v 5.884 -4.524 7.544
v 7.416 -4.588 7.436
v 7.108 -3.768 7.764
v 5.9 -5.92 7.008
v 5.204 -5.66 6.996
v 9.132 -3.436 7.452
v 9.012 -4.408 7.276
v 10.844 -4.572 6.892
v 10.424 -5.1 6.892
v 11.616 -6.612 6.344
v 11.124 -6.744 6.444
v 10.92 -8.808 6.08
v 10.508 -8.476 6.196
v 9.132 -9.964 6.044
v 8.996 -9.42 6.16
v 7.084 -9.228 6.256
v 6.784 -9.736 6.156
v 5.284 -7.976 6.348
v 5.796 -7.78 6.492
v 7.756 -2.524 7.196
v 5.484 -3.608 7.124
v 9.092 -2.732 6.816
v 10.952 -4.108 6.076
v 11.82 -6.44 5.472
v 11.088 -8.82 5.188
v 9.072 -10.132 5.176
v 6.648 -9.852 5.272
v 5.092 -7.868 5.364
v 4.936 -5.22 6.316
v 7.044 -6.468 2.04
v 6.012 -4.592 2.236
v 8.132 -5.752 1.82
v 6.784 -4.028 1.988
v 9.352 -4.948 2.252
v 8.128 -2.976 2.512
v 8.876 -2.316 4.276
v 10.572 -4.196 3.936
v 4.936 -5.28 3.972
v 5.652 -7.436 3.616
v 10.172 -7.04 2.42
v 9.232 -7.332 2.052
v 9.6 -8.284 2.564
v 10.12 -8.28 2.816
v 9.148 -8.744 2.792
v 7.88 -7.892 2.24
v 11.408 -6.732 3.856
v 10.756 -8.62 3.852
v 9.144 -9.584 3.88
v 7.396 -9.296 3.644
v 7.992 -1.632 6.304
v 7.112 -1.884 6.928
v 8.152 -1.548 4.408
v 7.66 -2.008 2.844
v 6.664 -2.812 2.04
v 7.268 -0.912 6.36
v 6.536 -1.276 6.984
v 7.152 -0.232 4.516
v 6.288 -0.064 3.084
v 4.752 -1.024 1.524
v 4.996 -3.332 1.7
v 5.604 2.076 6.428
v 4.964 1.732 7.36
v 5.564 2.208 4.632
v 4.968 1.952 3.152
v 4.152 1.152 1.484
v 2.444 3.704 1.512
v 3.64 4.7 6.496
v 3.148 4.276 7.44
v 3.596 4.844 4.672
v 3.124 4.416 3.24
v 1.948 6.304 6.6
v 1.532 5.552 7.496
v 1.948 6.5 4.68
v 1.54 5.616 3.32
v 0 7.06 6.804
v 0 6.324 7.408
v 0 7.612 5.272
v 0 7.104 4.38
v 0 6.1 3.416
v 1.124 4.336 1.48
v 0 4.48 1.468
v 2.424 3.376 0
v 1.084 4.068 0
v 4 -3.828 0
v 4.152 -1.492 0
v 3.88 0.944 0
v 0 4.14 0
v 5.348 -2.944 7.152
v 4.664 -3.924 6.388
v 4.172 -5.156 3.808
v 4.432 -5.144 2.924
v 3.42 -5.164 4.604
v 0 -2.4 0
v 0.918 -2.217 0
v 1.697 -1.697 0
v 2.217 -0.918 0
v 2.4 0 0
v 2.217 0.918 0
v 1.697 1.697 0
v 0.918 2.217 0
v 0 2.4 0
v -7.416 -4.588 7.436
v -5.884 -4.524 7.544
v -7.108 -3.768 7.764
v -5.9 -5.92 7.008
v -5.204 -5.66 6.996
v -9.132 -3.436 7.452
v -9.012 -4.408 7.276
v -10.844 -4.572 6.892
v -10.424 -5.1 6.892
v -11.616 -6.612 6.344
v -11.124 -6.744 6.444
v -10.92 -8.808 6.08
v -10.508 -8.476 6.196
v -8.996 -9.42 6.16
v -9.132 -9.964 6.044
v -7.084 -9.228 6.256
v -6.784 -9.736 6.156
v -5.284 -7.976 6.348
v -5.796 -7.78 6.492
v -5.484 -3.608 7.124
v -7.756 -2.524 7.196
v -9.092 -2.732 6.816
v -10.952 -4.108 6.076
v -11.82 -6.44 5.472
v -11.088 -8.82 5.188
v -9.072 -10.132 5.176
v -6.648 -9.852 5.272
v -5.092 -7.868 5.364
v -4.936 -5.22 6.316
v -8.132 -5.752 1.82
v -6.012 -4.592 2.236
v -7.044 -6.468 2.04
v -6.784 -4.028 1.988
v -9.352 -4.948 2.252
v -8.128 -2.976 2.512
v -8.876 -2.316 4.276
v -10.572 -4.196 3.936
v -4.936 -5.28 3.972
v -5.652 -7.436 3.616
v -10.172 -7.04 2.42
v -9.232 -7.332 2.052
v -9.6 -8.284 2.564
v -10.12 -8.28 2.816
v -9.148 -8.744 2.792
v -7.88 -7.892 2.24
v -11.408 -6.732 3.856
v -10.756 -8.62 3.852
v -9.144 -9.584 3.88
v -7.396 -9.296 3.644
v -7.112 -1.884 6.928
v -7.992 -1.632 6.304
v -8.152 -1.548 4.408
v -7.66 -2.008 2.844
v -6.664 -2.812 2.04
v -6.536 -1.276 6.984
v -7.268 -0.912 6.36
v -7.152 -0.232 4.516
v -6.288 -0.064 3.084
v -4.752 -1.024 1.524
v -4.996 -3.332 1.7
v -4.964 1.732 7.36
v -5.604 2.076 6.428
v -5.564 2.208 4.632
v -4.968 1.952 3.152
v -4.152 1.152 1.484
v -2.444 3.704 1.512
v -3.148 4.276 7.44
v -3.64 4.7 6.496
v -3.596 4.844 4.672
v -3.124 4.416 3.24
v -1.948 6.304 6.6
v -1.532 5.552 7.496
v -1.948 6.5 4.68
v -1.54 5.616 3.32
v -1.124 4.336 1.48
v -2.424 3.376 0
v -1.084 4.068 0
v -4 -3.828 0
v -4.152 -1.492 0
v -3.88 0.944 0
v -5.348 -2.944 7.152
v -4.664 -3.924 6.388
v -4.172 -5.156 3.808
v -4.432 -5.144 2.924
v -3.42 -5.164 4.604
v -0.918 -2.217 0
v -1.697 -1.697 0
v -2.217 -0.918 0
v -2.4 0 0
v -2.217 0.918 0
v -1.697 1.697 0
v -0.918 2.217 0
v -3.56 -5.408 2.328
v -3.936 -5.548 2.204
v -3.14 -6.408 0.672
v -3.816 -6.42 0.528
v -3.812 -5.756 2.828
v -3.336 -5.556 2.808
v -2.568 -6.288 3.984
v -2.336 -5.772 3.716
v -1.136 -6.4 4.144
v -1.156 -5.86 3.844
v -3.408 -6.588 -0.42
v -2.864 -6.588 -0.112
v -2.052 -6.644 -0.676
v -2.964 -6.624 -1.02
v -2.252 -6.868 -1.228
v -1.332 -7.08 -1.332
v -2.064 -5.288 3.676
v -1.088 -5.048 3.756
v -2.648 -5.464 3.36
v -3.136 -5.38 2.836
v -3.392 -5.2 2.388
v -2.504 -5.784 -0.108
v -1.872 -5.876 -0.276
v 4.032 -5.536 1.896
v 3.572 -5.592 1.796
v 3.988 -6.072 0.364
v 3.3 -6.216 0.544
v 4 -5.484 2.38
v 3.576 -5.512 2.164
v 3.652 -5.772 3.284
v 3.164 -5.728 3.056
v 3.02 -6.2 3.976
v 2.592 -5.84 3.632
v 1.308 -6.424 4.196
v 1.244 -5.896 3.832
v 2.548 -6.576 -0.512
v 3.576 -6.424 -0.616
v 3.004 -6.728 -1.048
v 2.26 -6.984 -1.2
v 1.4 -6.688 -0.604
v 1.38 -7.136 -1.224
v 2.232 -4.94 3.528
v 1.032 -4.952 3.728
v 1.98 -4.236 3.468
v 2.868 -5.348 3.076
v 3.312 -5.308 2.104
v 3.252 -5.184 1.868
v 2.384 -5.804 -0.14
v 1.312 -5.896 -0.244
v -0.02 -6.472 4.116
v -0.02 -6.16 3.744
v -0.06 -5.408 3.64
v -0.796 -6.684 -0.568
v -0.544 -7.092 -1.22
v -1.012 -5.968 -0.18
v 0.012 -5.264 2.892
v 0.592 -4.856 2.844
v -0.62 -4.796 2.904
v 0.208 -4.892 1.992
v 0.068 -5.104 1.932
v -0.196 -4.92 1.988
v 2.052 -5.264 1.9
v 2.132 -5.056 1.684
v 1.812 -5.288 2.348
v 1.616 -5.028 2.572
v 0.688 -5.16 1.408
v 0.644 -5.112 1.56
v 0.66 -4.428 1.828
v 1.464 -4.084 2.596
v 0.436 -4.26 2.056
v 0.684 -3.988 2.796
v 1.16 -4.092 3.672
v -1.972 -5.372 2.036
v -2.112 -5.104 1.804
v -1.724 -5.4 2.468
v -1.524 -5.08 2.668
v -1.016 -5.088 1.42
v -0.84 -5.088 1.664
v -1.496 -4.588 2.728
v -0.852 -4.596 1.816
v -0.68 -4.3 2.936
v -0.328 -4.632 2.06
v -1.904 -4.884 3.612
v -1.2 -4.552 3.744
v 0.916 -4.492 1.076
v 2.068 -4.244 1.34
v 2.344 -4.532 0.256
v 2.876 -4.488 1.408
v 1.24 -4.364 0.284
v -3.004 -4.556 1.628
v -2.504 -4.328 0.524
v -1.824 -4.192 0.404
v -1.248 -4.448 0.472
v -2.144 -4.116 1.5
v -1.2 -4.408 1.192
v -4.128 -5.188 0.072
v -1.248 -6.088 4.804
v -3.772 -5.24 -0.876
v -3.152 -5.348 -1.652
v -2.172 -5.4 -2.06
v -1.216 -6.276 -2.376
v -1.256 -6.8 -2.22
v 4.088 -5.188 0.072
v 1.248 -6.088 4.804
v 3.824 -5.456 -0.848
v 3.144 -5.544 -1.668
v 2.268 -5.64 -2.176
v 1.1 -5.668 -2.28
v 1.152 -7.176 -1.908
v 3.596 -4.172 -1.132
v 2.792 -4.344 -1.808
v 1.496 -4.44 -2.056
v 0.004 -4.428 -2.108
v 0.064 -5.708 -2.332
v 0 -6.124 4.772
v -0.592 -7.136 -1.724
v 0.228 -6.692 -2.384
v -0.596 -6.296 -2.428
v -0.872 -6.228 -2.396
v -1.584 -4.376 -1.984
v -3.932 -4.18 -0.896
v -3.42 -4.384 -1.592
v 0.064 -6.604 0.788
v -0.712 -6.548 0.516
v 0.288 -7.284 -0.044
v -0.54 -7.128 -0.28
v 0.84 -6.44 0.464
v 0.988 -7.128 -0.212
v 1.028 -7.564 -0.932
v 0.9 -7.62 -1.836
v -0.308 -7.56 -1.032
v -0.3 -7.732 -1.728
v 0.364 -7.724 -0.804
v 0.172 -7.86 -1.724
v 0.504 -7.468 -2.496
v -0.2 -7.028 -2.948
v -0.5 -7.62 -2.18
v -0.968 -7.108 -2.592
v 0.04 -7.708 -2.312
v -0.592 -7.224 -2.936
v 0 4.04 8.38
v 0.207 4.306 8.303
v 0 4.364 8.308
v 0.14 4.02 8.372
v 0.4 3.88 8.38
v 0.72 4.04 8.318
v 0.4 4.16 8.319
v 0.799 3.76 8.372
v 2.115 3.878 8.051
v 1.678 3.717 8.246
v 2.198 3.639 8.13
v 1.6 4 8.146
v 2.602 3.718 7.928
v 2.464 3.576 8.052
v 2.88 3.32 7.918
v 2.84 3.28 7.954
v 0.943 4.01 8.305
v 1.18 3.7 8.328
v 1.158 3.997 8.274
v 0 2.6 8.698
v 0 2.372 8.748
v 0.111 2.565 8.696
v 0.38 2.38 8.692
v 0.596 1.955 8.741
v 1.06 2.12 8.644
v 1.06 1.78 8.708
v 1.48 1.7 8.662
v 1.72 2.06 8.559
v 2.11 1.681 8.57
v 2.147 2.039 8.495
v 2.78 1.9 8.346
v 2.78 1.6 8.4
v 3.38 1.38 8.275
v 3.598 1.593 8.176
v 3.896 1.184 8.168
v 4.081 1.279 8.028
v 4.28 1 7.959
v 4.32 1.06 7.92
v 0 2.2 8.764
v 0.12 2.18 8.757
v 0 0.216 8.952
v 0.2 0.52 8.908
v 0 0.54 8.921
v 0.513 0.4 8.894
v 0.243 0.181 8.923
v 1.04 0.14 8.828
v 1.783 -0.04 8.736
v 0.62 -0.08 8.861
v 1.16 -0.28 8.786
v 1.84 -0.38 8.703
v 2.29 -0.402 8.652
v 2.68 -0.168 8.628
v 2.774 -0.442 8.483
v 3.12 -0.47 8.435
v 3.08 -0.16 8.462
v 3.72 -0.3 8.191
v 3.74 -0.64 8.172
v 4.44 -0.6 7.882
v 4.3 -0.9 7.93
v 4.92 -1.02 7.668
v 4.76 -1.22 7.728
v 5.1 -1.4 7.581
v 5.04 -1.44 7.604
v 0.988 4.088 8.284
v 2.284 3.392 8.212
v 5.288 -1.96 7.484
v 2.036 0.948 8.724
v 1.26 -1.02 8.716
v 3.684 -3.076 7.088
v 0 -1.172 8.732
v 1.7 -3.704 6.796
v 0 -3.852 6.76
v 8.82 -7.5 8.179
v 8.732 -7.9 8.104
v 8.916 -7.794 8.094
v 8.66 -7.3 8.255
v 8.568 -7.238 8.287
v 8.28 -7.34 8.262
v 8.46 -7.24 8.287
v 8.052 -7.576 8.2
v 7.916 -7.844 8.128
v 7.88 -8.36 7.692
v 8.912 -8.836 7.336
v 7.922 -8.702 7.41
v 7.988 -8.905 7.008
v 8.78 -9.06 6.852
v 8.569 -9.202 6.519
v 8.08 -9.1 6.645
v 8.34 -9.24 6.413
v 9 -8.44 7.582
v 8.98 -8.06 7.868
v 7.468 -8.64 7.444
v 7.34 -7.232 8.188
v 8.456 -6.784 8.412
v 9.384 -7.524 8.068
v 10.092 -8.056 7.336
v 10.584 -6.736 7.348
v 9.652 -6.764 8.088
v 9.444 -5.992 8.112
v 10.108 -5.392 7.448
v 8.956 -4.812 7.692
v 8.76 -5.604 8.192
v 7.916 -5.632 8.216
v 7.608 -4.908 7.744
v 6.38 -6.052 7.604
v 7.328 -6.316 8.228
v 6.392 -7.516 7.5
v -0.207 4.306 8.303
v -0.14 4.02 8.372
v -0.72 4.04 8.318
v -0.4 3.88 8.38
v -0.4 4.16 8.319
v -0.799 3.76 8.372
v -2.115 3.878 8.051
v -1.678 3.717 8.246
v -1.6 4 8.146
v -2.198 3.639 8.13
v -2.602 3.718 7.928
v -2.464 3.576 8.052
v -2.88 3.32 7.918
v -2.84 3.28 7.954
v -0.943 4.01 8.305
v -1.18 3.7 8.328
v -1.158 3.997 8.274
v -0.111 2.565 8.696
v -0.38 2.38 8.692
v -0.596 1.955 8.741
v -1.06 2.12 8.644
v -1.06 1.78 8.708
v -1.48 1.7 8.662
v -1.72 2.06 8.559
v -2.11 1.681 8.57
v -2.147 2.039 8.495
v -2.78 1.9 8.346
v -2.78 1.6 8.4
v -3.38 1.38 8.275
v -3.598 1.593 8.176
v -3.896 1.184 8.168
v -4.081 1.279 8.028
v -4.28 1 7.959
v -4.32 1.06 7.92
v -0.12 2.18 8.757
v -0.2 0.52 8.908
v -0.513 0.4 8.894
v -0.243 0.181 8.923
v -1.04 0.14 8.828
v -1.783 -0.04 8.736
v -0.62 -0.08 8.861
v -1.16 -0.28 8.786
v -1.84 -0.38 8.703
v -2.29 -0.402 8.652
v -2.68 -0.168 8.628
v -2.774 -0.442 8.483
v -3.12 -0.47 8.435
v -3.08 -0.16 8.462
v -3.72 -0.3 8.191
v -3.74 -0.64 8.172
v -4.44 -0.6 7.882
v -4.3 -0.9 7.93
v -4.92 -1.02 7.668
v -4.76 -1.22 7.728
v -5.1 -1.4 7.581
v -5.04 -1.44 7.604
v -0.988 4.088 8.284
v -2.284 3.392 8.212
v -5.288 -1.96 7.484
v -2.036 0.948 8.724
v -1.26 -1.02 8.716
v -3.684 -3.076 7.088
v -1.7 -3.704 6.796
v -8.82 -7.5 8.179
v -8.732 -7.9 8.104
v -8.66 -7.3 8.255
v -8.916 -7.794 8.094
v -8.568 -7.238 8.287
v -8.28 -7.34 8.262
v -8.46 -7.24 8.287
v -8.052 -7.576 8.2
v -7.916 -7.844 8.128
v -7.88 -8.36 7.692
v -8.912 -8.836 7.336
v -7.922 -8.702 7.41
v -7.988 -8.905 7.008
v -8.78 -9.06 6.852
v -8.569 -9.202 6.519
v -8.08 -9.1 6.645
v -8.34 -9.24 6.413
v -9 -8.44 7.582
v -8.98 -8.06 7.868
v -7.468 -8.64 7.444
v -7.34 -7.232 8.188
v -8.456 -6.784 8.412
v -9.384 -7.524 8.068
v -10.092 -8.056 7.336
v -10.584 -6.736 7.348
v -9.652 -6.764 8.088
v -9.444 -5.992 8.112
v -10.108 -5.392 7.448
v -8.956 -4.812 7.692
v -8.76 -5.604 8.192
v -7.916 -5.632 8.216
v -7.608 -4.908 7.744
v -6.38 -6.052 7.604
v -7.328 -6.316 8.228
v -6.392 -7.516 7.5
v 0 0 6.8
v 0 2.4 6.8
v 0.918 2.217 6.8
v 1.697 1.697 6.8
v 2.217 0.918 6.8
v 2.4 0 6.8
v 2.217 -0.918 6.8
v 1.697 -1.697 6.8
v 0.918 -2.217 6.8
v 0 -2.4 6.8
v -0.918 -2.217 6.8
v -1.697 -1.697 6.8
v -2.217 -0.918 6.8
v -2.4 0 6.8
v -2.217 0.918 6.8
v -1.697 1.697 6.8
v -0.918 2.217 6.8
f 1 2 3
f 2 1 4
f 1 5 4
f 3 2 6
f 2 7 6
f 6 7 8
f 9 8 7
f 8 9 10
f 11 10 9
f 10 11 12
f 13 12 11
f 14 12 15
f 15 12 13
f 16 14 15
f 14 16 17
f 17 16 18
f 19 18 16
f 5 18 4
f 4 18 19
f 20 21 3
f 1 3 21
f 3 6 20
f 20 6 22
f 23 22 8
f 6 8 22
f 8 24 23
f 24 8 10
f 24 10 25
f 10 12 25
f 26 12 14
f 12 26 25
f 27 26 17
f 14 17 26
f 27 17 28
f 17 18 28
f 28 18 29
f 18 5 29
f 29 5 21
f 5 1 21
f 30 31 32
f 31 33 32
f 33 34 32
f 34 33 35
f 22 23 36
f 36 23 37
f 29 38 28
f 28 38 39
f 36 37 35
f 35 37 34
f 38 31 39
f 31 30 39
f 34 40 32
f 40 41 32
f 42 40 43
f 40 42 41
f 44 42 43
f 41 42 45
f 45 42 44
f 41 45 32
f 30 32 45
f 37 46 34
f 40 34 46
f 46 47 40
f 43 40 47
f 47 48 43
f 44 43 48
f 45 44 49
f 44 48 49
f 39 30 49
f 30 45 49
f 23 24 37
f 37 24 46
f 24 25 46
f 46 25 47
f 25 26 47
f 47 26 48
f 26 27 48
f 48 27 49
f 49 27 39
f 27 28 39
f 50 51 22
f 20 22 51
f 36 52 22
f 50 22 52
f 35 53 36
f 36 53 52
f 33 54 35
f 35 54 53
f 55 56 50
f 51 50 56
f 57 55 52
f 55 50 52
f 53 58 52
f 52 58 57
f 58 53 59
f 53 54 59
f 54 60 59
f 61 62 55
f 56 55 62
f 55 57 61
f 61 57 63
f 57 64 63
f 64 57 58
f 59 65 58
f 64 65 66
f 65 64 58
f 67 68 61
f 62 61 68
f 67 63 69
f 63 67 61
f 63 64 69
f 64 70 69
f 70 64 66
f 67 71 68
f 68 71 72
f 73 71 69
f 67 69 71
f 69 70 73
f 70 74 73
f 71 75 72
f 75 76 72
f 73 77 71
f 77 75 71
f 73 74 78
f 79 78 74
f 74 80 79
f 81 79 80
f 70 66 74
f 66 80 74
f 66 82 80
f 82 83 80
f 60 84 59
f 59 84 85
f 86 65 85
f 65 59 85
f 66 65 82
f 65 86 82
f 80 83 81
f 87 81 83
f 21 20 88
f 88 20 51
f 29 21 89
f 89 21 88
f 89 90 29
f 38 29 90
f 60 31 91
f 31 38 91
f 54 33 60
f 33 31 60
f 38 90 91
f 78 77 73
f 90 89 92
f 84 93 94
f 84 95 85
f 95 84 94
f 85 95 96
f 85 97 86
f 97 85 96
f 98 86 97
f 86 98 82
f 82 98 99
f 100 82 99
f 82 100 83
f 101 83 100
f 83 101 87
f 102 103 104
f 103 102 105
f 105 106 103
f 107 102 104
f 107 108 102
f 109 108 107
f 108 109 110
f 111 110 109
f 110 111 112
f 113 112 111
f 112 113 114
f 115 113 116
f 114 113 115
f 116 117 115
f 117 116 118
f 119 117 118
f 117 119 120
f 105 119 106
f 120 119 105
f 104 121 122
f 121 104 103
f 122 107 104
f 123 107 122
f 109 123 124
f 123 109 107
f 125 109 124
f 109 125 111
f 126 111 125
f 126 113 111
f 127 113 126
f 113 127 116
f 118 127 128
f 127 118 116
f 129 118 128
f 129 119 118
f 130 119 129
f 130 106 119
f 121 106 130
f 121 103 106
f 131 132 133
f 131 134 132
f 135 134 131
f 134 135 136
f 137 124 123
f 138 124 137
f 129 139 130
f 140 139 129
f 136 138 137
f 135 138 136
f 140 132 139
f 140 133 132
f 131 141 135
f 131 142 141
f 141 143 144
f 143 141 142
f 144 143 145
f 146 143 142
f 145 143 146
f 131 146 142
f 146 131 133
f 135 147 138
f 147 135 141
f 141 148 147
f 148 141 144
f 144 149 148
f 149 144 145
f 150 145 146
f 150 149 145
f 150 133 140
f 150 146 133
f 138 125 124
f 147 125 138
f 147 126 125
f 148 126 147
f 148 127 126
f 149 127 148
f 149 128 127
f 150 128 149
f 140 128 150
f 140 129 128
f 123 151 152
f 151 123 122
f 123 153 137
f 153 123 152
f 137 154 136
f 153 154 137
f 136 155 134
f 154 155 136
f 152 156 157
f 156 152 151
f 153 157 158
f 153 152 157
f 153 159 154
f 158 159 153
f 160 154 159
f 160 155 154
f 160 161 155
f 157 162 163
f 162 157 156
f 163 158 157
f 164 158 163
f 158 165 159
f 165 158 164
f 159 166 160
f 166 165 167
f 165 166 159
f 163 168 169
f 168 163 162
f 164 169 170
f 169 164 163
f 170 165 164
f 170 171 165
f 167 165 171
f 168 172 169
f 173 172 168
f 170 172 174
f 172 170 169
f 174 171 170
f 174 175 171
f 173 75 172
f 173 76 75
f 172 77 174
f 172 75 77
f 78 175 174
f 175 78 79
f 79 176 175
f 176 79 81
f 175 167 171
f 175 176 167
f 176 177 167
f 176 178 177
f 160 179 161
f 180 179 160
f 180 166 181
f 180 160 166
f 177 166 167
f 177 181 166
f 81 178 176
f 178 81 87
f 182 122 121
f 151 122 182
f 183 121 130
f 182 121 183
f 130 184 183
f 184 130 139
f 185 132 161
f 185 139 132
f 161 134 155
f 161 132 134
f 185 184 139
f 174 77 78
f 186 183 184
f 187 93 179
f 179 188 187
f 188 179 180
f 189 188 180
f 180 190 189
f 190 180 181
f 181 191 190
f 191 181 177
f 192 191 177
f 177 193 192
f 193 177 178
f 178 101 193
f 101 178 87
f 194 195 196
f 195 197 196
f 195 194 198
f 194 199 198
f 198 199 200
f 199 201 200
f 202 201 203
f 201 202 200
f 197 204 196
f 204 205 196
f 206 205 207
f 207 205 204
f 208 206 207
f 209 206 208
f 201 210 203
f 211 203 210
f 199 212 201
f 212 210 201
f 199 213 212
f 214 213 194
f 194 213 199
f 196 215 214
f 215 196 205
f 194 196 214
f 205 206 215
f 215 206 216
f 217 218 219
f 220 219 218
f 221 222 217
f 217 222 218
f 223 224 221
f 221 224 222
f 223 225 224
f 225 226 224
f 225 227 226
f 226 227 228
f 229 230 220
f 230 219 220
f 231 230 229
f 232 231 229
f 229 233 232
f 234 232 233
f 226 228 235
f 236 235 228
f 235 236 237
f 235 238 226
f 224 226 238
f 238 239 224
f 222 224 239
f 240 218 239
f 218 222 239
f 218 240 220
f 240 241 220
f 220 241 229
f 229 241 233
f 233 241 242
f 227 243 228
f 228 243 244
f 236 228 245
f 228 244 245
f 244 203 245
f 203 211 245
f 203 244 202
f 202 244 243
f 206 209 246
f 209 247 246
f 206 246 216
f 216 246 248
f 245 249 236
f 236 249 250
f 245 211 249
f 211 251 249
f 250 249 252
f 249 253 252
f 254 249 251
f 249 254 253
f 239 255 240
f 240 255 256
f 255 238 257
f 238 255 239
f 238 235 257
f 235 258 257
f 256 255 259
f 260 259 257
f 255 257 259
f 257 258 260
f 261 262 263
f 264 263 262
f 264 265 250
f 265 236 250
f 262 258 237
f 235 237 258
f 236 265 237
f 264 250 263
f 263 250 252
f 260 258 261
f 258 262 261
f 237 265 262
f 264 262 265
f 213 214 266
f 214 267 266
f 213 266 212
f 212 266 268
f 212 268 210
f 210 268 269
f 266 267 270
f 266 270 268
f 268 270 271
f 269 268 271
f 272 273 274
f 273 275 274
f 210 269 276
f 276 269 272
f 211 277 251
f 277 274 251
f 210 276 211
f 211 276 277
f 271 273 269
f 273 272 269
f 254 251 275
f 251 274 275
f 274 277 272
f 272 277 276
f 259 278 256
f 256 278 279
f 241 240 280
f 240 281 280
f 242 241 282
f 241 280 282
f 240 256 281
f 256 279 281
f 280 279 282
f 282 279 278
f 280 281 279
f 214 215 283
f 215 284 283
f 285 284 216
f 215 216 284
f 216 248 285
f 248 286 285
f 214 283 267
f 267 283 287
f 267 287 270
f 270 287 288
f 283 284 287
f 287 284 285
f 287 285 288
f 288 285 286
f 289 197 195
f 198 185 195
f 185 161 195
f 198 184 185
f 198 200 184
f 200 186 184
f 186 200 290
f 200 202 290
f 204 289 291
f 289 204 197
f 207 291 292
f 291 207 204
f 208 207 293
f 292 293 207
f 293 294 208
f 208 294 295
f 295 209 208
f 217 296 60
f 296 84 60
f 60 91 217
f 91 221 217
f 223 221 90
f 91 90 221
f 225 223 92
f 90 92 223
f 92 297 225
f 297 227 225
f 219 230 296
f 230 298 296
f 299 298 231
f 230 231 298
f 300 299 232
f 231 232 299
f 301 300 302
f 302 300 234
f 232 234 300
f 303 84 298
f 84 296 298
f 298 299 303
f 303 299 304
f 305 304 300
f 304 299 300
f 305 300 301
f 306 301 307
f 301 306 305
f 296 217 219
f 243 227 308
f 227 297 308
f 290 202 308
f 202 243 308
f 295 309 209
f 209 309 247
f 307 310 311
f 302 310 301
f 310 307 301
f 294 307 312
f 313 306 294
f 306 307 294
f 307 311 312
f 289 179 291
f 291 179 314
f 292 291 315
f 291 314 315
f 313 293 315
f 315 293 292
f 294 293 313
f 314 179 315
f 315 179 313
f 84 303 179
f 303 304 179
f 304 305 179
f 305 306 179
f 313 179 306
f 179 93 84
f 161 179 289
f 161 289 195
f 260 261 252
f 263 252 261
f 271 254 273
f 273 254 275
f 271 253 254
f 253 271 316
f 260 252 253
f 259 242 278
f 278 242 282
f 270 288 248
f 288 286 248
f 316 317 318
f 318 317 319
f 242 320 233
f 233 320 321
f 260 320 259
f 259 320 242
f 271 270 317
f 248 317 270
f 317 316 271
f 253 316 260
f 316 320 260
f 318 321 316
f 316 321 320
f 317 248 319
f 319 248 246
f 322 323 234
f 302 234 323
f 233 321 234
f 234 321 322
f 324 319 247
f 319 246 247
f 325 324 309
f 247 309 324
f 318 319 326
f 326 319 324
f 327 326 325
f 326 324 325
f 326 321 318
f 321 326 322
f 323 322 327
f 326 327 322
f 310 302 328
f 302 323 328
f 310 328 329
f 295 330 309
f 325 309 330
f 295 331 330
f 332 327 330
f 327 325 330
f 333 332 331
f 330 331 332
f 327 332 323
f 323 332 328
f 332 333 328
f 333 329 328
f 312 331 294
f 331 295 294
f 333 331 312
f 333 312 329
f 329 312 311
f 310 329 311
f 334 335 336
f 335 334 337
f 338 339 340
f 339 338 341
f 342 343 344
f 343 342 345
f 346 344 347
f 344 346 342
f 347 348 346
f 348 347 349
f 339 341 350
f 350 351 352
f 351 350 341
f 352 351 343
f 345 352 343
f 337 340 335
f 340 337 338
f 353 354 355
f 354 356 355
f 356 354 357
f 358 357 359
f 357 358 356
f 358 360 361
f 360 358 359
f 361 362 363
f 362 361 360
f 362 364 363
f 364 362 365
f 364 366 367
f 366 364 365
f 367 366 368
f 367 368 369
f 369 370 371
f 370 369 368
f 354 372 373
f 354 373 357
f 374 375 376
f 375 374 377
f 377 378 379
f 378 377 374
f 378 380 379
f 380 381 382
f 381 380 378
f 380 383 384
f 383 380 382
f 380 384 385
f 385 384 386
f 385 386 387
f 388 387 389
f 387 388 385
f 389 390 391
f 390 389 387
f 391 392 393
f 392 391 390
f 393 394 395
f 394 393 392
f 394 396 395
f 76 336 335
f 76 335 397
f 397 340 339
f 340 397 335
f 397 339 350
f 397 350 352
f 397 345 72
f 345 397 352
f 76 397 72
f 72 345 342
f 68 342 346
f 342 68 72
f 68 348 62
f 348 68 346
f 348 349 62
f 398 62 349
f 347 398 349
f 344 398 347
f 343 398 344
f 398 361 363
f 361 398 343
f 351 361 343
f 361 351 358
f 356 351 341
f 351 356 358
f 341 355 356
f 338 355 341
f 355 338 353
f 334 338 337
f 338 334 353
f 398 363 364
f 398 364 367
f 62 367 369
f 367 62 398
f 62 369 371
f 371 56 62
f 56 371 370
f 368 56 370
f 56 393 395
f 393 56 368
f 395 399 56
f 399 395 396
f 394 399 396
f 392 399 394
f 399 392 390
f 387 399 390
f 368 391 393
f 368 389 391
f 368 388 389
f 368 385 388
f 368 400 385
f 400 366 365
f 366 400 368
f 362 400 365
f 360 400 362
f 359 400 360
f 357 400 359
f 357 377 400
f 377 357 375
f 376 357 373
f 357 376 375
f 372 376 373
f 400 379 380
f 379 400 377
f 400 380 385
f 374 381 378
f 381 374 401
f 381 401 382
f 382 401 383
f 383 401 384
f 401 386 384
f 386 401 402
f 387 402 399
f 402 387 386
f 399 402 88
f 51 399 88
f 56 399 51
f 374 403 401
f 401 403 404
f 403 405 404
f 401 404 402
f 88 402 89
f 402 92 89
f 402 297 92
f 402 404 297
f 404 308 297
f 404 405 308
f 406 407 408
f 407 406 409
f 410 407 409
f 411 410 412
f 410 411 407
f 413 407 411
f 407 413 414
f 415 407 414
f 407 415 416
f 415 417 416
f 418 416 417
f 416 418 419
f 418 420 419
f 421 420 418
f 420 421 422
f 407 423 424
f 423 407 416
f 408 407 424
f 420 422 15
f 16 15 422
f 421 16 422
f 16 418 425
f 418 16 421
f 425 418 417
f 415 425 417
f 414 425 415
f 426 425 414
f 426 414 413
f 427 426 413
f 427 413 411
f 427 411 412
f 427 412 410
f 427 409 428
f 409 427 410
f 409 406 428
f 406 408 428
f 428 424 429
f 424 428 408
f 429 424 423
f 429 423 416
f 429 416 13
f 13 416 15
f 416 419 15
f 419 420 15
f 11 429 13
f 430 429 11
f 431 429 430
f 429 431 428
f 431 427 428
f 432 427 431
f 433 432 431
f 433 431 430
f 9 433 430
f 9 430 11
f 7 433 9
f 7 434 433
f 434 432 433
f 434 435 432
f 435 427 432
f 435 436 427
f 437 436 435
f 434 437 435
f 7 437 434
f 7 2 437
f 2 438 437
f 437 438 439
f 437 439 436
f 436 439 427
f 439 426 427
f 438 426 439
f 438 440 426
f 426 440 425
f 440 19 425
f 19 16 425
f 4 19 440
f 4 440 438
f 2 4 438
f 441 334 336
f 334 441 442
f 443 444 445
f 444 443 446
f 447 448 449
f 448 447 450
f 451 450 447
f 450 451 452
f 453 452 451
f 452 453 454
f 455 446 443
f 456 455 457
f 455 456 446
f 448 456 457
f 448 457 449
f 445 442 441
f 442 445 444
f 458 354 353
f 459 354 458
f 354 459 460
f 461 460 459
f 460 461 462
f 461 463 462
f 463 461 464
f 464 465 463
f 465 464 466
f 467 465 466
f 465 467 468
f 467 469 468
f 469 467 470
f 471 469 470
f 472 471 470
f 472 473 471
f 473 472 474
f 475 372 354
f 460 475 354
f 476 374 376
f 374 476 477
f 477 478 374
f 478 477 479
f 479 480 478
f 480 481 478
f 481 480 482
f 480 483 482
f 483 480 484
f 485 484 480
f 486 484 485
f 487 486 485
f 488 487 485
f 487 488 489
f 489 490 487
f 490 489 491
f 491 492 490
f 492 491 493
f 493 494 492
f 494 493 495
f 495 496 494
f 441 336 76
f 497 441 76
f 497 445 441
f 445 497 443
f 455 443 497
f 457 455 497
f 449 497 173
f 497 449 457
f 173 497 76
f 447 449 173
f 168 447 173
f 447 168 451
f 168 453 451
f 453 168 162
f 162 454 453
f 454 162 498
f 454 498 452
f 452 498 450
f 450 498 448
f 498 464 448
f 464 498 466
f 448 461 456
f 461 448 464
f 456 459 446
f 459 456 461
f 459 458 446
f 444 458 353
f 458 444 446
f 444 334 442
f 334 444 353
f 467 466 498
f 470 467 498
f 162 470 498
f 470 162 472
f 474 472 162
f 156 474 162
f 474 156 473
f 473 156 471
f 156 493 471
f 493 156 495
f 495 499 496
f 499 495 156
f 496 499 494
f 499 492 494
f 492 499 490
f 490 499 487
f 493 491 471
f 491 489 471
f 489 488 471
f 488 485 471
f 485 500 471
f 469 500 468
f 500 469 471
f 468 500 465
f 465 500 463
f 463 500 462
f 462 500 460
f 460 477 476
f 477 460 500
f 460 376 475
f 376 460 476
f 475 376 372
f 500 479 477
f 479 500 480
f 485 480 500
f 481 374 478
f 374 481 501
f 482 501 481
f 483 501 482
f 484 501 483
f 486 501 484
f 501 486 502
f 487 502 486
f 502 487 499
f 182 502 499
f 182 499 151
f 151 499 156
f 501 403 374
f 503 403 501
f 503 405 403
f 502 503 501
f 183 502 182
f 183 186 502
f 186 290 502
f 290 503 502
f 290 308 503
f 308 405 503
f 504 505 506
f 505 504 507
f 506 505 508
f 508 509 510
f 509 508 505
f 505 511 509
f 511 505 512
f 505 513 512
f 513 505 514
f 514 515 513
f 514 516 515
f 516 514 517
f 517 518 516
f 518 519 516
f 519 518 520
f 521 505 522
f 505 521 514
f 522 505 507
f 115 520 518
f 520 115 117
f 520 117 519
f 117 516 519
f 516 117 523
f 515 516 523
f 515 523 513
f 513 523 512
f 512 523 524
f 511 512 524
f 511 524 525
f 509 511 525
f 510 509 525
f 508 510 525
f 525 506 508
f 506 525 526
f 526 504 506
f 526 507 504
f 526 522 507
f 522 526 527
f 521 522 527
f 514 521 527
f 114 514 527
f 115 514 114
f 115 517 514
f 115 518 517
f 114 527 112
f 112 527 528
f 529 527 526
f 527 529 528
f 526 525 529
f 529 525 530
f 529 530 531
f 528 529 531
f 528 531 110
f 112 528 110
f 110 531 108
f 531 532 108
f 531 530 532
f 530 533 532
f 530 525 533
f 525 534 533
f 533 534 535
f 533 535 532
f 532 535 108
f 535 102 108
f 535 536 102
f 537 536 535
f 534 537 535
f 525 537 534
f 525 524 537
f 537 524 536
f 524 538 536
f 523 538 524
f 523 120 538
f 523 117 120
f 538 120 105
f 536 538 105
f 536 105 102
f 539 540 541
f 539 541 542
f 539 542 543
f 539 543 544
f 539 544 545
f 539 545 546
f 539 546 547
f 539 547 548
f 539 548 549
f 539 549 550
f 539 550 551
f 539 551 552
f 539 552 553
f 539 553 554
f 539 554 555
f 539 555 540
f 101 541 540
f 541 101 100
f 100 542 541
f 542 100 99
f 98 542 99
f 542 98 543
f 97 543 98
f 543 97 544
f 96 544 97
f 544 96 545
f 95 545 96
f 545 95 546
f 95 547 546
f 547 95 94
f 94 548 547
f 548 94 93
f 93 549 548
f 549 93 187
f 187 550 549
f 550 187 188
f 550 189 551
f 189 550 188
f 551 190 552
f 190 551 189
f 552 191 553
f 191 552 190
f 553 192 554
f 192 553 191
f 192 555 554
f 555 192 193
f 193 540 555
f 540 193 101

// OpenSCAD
use <../lib.scad>
use <../p/4-4cylc.scad>
use <s/85947s01.scad>
use <s/85947s02.scad>
use <s/85947s03.scad>
use <s/85947s04p01.scad>
$fa=1; $fs=0.2;
function ldraw_lib__85947p01(realsolid=false) = [
// 0 Minifig Head Alien Squidman with Black Eyes & Lines Pattern
// 0 Name: 85947p01.dat
// 0 Author: Philippe Hurbain [Philo]
// 0 !LDRAW_ORG Part UPDATE 2013-01
// 0 !LICENSE Licensed under CC BY 2.0 and CC BY 4.0 : see CAreadme.txt
// 
// 0 BFC CERTIFY CCW
  [0,"BFC","CERTIFY"],
  [0,"BFC","CCW"],
// 
// 0 !HISTORY 2013-01-06 {LEGO Digital Designer} Original part shape
// 0 !HISTORY 2013-01-06 [Philo] File preparation for LDraw Parts Tracker
// 0 !HISTORY 2013-07-21 [PTadmin] Official Update 2013-01
// 
// 
// 1 16 0 0 0 1 0 0 0 1 0 0 0 1 s\85947s01.dat
  [1,16,0,0,0,1,0,0,0,1,0,0,0,1, ldraw_lib__s__85947s01(realsolid)],
// 1 16 0 0 0 -1 0 0 0 1 0 0 0 1 s\85947s01.dat
  [1,16,0,0,0,-1,0,0,0,1,0,0,0,1, ldraw_lib__s__85947s01(realsolid)],
// 1 16 0 0 0 1 0 0 0 1 0 0 0 1 s\85947s02.dat
  [1,16,0,0,0,1,0,0,0,1,0,0,0,1, ldraw_lib__s__85947s02(realsolid)],
// 1 4 0 0 0 1 0 0 0 1 0 0 0 1 s\85947s03.dat
  [1,4,0,0,0,1,0,0,0,1,0,0,0,1, ldraw_lib__s__85947s03(realsolid)],
// 1 16 0 0 0 1 0 0 0 1 0 0 0 1 s\85947s04p01.dat
  [1,16,0,0,0,1,0,0,0,1,0,0,0,1, ldraw_lib__s__85947s04p01(realsolid)],
// 1 16 0 0 0 -1 0 0 0 1 0 0 0 1 s\85947s04p01.dat
  [1,16,0,0,0,-1,0,0,0,1,0,0,0,1, ldraw_lib__s__85947s04p01(realsolid)],
// 0 BFC INVERTNEXT
  [0,"BFC","INVERTNEXT"],
// 1 16 0 -17 0 0 0 6 0 17 0 6 0 0 4-4cylc.dat
  [1,16,0,-17,0,0,0,6,0,17,0,6,0,0, ldraw_lib__4_4cylc(realsolid)],
// 5 24 0 -17.01 17.65 0 -18.52 15.81 3.83 -18.74 13.88 -3.83 -18.74 13.88
  [5,24,0,-17.01,17.65,0,-18.52,15.81,3.83,-18.74,13.88,-3.83,-18.74,13.88],
// 5 24 0 -13.18 19.03 0 -17.01 17.65 4.87 -16.5 15.76 -4.87 -16.5 15.76
  [5,24,0,-13.18,19.03,0,-17.01,17.65,4.87,-16.5,15.76,-4.87,-16.5,15.76],
// 5 24 0 -8.54 15.25 0 -10.95 17.76 3.85 -8.3 14.04 -3.85 -8.3 14.04
  [5,24,0,-8.54,15.25,0,-10.95,17.76,3.85,-8.3,14.04,-3.85,-8.3,14.04],
// 5 24 0 -3.67 11.2 0 -8.54 15.25 2.81 -3.7 10.84 -2.81 -3.7 10.84
  [5,24,0,-3.67,11.2,0,-8.54,15.25,2.81,-3.7,10.84,-2.81,-3.7,10.84],
// 5 24 0 0 10.35 0 -3.67 11.2 2.71 0 10.17 -2.71 0 10.17
  [5,24,0,0,10.35,0,-3.67,11.2,2.71,0,10.17,-2.71,0,10.17],
// 5 24 0 -10.95 17.76 0 -13.18 19.03 4.87 -11.7 16.25 -4.87 -11.7 16.25
  [5,24,0,-10.95,17.76,0,-13.18,19.03,4.87,-11.7,16.25,-4.87,-11.7,16.25],
// 5 24 0 -18.52 15.81 0 -20.77 10.91 2.47 -20.71 10.22 -2.47 -20.71 10.22
  [5,24,0,-18.52,15.81,0,-20.77,10.91,2.47,-20.71,10.22,-2.47,-20.71,10.22],
// 5 24 0 -21.87 5.93 0 -22.38 0.54 5.09 -21.81 2.37 -5.09 -21.81 2.37
  [5,24,0,-21.87,5.93,0,-22.38,0.54,5.09,-21.81,2.37,-5.09,-21.81,2.37],
// 5 24 0 -20.77 10.91 0 -21.87 5.93 2.47 -20.71 10.22 -2.47 -20.71 10.22
  [5,24,0,-20.77,10.91,0,-21.87,5.93,2.47,-20.71,10.22,-2.47,-20.71,10.22],
// 5 24 0 -22.38 0.54 0 -21.83 -2.93 3.15 -21.79 -2.55 -3.15 -21.79 -2.55
  [5,24,0,-22.38,0.54,0,-21.83,-2.93,3.15,-21.79,-2.55,-3.15,-21.79,-2.55],
// 5 24 0 -21.83 -2.93 0 -16.9 -9.63 4.25 -16.99 -9.26 -4.25 -16.99 -9.26
  [5,24,0,-21.83,-2.93,0,-16.9,-9.63,4.25,-16.99,-9.26,-4.25,-16.99,-9.26],
// 5 24 0 -16.9 -9.63 0 -11.93 -15.31 4.25 -16.99 -9.26 -4.25 -16.99 -9.26
  [5,24,0,-16.9,-9.63,0,-11.93,-15.31,4.25,-16.99,-9.26,-4.25,-16.99,-9.26],
];
module ldraw_lib__85947p01(step=0, col=false, unit=2/5, alt=false, line=0.2, solid=!$preview)
    makepoly(ldraw_lib__85947p01(solid), step=step, col=col, unit=unit, alt=alt, line=line, solid=solid);
ldraw_lib__85947p01(line=0.2);
